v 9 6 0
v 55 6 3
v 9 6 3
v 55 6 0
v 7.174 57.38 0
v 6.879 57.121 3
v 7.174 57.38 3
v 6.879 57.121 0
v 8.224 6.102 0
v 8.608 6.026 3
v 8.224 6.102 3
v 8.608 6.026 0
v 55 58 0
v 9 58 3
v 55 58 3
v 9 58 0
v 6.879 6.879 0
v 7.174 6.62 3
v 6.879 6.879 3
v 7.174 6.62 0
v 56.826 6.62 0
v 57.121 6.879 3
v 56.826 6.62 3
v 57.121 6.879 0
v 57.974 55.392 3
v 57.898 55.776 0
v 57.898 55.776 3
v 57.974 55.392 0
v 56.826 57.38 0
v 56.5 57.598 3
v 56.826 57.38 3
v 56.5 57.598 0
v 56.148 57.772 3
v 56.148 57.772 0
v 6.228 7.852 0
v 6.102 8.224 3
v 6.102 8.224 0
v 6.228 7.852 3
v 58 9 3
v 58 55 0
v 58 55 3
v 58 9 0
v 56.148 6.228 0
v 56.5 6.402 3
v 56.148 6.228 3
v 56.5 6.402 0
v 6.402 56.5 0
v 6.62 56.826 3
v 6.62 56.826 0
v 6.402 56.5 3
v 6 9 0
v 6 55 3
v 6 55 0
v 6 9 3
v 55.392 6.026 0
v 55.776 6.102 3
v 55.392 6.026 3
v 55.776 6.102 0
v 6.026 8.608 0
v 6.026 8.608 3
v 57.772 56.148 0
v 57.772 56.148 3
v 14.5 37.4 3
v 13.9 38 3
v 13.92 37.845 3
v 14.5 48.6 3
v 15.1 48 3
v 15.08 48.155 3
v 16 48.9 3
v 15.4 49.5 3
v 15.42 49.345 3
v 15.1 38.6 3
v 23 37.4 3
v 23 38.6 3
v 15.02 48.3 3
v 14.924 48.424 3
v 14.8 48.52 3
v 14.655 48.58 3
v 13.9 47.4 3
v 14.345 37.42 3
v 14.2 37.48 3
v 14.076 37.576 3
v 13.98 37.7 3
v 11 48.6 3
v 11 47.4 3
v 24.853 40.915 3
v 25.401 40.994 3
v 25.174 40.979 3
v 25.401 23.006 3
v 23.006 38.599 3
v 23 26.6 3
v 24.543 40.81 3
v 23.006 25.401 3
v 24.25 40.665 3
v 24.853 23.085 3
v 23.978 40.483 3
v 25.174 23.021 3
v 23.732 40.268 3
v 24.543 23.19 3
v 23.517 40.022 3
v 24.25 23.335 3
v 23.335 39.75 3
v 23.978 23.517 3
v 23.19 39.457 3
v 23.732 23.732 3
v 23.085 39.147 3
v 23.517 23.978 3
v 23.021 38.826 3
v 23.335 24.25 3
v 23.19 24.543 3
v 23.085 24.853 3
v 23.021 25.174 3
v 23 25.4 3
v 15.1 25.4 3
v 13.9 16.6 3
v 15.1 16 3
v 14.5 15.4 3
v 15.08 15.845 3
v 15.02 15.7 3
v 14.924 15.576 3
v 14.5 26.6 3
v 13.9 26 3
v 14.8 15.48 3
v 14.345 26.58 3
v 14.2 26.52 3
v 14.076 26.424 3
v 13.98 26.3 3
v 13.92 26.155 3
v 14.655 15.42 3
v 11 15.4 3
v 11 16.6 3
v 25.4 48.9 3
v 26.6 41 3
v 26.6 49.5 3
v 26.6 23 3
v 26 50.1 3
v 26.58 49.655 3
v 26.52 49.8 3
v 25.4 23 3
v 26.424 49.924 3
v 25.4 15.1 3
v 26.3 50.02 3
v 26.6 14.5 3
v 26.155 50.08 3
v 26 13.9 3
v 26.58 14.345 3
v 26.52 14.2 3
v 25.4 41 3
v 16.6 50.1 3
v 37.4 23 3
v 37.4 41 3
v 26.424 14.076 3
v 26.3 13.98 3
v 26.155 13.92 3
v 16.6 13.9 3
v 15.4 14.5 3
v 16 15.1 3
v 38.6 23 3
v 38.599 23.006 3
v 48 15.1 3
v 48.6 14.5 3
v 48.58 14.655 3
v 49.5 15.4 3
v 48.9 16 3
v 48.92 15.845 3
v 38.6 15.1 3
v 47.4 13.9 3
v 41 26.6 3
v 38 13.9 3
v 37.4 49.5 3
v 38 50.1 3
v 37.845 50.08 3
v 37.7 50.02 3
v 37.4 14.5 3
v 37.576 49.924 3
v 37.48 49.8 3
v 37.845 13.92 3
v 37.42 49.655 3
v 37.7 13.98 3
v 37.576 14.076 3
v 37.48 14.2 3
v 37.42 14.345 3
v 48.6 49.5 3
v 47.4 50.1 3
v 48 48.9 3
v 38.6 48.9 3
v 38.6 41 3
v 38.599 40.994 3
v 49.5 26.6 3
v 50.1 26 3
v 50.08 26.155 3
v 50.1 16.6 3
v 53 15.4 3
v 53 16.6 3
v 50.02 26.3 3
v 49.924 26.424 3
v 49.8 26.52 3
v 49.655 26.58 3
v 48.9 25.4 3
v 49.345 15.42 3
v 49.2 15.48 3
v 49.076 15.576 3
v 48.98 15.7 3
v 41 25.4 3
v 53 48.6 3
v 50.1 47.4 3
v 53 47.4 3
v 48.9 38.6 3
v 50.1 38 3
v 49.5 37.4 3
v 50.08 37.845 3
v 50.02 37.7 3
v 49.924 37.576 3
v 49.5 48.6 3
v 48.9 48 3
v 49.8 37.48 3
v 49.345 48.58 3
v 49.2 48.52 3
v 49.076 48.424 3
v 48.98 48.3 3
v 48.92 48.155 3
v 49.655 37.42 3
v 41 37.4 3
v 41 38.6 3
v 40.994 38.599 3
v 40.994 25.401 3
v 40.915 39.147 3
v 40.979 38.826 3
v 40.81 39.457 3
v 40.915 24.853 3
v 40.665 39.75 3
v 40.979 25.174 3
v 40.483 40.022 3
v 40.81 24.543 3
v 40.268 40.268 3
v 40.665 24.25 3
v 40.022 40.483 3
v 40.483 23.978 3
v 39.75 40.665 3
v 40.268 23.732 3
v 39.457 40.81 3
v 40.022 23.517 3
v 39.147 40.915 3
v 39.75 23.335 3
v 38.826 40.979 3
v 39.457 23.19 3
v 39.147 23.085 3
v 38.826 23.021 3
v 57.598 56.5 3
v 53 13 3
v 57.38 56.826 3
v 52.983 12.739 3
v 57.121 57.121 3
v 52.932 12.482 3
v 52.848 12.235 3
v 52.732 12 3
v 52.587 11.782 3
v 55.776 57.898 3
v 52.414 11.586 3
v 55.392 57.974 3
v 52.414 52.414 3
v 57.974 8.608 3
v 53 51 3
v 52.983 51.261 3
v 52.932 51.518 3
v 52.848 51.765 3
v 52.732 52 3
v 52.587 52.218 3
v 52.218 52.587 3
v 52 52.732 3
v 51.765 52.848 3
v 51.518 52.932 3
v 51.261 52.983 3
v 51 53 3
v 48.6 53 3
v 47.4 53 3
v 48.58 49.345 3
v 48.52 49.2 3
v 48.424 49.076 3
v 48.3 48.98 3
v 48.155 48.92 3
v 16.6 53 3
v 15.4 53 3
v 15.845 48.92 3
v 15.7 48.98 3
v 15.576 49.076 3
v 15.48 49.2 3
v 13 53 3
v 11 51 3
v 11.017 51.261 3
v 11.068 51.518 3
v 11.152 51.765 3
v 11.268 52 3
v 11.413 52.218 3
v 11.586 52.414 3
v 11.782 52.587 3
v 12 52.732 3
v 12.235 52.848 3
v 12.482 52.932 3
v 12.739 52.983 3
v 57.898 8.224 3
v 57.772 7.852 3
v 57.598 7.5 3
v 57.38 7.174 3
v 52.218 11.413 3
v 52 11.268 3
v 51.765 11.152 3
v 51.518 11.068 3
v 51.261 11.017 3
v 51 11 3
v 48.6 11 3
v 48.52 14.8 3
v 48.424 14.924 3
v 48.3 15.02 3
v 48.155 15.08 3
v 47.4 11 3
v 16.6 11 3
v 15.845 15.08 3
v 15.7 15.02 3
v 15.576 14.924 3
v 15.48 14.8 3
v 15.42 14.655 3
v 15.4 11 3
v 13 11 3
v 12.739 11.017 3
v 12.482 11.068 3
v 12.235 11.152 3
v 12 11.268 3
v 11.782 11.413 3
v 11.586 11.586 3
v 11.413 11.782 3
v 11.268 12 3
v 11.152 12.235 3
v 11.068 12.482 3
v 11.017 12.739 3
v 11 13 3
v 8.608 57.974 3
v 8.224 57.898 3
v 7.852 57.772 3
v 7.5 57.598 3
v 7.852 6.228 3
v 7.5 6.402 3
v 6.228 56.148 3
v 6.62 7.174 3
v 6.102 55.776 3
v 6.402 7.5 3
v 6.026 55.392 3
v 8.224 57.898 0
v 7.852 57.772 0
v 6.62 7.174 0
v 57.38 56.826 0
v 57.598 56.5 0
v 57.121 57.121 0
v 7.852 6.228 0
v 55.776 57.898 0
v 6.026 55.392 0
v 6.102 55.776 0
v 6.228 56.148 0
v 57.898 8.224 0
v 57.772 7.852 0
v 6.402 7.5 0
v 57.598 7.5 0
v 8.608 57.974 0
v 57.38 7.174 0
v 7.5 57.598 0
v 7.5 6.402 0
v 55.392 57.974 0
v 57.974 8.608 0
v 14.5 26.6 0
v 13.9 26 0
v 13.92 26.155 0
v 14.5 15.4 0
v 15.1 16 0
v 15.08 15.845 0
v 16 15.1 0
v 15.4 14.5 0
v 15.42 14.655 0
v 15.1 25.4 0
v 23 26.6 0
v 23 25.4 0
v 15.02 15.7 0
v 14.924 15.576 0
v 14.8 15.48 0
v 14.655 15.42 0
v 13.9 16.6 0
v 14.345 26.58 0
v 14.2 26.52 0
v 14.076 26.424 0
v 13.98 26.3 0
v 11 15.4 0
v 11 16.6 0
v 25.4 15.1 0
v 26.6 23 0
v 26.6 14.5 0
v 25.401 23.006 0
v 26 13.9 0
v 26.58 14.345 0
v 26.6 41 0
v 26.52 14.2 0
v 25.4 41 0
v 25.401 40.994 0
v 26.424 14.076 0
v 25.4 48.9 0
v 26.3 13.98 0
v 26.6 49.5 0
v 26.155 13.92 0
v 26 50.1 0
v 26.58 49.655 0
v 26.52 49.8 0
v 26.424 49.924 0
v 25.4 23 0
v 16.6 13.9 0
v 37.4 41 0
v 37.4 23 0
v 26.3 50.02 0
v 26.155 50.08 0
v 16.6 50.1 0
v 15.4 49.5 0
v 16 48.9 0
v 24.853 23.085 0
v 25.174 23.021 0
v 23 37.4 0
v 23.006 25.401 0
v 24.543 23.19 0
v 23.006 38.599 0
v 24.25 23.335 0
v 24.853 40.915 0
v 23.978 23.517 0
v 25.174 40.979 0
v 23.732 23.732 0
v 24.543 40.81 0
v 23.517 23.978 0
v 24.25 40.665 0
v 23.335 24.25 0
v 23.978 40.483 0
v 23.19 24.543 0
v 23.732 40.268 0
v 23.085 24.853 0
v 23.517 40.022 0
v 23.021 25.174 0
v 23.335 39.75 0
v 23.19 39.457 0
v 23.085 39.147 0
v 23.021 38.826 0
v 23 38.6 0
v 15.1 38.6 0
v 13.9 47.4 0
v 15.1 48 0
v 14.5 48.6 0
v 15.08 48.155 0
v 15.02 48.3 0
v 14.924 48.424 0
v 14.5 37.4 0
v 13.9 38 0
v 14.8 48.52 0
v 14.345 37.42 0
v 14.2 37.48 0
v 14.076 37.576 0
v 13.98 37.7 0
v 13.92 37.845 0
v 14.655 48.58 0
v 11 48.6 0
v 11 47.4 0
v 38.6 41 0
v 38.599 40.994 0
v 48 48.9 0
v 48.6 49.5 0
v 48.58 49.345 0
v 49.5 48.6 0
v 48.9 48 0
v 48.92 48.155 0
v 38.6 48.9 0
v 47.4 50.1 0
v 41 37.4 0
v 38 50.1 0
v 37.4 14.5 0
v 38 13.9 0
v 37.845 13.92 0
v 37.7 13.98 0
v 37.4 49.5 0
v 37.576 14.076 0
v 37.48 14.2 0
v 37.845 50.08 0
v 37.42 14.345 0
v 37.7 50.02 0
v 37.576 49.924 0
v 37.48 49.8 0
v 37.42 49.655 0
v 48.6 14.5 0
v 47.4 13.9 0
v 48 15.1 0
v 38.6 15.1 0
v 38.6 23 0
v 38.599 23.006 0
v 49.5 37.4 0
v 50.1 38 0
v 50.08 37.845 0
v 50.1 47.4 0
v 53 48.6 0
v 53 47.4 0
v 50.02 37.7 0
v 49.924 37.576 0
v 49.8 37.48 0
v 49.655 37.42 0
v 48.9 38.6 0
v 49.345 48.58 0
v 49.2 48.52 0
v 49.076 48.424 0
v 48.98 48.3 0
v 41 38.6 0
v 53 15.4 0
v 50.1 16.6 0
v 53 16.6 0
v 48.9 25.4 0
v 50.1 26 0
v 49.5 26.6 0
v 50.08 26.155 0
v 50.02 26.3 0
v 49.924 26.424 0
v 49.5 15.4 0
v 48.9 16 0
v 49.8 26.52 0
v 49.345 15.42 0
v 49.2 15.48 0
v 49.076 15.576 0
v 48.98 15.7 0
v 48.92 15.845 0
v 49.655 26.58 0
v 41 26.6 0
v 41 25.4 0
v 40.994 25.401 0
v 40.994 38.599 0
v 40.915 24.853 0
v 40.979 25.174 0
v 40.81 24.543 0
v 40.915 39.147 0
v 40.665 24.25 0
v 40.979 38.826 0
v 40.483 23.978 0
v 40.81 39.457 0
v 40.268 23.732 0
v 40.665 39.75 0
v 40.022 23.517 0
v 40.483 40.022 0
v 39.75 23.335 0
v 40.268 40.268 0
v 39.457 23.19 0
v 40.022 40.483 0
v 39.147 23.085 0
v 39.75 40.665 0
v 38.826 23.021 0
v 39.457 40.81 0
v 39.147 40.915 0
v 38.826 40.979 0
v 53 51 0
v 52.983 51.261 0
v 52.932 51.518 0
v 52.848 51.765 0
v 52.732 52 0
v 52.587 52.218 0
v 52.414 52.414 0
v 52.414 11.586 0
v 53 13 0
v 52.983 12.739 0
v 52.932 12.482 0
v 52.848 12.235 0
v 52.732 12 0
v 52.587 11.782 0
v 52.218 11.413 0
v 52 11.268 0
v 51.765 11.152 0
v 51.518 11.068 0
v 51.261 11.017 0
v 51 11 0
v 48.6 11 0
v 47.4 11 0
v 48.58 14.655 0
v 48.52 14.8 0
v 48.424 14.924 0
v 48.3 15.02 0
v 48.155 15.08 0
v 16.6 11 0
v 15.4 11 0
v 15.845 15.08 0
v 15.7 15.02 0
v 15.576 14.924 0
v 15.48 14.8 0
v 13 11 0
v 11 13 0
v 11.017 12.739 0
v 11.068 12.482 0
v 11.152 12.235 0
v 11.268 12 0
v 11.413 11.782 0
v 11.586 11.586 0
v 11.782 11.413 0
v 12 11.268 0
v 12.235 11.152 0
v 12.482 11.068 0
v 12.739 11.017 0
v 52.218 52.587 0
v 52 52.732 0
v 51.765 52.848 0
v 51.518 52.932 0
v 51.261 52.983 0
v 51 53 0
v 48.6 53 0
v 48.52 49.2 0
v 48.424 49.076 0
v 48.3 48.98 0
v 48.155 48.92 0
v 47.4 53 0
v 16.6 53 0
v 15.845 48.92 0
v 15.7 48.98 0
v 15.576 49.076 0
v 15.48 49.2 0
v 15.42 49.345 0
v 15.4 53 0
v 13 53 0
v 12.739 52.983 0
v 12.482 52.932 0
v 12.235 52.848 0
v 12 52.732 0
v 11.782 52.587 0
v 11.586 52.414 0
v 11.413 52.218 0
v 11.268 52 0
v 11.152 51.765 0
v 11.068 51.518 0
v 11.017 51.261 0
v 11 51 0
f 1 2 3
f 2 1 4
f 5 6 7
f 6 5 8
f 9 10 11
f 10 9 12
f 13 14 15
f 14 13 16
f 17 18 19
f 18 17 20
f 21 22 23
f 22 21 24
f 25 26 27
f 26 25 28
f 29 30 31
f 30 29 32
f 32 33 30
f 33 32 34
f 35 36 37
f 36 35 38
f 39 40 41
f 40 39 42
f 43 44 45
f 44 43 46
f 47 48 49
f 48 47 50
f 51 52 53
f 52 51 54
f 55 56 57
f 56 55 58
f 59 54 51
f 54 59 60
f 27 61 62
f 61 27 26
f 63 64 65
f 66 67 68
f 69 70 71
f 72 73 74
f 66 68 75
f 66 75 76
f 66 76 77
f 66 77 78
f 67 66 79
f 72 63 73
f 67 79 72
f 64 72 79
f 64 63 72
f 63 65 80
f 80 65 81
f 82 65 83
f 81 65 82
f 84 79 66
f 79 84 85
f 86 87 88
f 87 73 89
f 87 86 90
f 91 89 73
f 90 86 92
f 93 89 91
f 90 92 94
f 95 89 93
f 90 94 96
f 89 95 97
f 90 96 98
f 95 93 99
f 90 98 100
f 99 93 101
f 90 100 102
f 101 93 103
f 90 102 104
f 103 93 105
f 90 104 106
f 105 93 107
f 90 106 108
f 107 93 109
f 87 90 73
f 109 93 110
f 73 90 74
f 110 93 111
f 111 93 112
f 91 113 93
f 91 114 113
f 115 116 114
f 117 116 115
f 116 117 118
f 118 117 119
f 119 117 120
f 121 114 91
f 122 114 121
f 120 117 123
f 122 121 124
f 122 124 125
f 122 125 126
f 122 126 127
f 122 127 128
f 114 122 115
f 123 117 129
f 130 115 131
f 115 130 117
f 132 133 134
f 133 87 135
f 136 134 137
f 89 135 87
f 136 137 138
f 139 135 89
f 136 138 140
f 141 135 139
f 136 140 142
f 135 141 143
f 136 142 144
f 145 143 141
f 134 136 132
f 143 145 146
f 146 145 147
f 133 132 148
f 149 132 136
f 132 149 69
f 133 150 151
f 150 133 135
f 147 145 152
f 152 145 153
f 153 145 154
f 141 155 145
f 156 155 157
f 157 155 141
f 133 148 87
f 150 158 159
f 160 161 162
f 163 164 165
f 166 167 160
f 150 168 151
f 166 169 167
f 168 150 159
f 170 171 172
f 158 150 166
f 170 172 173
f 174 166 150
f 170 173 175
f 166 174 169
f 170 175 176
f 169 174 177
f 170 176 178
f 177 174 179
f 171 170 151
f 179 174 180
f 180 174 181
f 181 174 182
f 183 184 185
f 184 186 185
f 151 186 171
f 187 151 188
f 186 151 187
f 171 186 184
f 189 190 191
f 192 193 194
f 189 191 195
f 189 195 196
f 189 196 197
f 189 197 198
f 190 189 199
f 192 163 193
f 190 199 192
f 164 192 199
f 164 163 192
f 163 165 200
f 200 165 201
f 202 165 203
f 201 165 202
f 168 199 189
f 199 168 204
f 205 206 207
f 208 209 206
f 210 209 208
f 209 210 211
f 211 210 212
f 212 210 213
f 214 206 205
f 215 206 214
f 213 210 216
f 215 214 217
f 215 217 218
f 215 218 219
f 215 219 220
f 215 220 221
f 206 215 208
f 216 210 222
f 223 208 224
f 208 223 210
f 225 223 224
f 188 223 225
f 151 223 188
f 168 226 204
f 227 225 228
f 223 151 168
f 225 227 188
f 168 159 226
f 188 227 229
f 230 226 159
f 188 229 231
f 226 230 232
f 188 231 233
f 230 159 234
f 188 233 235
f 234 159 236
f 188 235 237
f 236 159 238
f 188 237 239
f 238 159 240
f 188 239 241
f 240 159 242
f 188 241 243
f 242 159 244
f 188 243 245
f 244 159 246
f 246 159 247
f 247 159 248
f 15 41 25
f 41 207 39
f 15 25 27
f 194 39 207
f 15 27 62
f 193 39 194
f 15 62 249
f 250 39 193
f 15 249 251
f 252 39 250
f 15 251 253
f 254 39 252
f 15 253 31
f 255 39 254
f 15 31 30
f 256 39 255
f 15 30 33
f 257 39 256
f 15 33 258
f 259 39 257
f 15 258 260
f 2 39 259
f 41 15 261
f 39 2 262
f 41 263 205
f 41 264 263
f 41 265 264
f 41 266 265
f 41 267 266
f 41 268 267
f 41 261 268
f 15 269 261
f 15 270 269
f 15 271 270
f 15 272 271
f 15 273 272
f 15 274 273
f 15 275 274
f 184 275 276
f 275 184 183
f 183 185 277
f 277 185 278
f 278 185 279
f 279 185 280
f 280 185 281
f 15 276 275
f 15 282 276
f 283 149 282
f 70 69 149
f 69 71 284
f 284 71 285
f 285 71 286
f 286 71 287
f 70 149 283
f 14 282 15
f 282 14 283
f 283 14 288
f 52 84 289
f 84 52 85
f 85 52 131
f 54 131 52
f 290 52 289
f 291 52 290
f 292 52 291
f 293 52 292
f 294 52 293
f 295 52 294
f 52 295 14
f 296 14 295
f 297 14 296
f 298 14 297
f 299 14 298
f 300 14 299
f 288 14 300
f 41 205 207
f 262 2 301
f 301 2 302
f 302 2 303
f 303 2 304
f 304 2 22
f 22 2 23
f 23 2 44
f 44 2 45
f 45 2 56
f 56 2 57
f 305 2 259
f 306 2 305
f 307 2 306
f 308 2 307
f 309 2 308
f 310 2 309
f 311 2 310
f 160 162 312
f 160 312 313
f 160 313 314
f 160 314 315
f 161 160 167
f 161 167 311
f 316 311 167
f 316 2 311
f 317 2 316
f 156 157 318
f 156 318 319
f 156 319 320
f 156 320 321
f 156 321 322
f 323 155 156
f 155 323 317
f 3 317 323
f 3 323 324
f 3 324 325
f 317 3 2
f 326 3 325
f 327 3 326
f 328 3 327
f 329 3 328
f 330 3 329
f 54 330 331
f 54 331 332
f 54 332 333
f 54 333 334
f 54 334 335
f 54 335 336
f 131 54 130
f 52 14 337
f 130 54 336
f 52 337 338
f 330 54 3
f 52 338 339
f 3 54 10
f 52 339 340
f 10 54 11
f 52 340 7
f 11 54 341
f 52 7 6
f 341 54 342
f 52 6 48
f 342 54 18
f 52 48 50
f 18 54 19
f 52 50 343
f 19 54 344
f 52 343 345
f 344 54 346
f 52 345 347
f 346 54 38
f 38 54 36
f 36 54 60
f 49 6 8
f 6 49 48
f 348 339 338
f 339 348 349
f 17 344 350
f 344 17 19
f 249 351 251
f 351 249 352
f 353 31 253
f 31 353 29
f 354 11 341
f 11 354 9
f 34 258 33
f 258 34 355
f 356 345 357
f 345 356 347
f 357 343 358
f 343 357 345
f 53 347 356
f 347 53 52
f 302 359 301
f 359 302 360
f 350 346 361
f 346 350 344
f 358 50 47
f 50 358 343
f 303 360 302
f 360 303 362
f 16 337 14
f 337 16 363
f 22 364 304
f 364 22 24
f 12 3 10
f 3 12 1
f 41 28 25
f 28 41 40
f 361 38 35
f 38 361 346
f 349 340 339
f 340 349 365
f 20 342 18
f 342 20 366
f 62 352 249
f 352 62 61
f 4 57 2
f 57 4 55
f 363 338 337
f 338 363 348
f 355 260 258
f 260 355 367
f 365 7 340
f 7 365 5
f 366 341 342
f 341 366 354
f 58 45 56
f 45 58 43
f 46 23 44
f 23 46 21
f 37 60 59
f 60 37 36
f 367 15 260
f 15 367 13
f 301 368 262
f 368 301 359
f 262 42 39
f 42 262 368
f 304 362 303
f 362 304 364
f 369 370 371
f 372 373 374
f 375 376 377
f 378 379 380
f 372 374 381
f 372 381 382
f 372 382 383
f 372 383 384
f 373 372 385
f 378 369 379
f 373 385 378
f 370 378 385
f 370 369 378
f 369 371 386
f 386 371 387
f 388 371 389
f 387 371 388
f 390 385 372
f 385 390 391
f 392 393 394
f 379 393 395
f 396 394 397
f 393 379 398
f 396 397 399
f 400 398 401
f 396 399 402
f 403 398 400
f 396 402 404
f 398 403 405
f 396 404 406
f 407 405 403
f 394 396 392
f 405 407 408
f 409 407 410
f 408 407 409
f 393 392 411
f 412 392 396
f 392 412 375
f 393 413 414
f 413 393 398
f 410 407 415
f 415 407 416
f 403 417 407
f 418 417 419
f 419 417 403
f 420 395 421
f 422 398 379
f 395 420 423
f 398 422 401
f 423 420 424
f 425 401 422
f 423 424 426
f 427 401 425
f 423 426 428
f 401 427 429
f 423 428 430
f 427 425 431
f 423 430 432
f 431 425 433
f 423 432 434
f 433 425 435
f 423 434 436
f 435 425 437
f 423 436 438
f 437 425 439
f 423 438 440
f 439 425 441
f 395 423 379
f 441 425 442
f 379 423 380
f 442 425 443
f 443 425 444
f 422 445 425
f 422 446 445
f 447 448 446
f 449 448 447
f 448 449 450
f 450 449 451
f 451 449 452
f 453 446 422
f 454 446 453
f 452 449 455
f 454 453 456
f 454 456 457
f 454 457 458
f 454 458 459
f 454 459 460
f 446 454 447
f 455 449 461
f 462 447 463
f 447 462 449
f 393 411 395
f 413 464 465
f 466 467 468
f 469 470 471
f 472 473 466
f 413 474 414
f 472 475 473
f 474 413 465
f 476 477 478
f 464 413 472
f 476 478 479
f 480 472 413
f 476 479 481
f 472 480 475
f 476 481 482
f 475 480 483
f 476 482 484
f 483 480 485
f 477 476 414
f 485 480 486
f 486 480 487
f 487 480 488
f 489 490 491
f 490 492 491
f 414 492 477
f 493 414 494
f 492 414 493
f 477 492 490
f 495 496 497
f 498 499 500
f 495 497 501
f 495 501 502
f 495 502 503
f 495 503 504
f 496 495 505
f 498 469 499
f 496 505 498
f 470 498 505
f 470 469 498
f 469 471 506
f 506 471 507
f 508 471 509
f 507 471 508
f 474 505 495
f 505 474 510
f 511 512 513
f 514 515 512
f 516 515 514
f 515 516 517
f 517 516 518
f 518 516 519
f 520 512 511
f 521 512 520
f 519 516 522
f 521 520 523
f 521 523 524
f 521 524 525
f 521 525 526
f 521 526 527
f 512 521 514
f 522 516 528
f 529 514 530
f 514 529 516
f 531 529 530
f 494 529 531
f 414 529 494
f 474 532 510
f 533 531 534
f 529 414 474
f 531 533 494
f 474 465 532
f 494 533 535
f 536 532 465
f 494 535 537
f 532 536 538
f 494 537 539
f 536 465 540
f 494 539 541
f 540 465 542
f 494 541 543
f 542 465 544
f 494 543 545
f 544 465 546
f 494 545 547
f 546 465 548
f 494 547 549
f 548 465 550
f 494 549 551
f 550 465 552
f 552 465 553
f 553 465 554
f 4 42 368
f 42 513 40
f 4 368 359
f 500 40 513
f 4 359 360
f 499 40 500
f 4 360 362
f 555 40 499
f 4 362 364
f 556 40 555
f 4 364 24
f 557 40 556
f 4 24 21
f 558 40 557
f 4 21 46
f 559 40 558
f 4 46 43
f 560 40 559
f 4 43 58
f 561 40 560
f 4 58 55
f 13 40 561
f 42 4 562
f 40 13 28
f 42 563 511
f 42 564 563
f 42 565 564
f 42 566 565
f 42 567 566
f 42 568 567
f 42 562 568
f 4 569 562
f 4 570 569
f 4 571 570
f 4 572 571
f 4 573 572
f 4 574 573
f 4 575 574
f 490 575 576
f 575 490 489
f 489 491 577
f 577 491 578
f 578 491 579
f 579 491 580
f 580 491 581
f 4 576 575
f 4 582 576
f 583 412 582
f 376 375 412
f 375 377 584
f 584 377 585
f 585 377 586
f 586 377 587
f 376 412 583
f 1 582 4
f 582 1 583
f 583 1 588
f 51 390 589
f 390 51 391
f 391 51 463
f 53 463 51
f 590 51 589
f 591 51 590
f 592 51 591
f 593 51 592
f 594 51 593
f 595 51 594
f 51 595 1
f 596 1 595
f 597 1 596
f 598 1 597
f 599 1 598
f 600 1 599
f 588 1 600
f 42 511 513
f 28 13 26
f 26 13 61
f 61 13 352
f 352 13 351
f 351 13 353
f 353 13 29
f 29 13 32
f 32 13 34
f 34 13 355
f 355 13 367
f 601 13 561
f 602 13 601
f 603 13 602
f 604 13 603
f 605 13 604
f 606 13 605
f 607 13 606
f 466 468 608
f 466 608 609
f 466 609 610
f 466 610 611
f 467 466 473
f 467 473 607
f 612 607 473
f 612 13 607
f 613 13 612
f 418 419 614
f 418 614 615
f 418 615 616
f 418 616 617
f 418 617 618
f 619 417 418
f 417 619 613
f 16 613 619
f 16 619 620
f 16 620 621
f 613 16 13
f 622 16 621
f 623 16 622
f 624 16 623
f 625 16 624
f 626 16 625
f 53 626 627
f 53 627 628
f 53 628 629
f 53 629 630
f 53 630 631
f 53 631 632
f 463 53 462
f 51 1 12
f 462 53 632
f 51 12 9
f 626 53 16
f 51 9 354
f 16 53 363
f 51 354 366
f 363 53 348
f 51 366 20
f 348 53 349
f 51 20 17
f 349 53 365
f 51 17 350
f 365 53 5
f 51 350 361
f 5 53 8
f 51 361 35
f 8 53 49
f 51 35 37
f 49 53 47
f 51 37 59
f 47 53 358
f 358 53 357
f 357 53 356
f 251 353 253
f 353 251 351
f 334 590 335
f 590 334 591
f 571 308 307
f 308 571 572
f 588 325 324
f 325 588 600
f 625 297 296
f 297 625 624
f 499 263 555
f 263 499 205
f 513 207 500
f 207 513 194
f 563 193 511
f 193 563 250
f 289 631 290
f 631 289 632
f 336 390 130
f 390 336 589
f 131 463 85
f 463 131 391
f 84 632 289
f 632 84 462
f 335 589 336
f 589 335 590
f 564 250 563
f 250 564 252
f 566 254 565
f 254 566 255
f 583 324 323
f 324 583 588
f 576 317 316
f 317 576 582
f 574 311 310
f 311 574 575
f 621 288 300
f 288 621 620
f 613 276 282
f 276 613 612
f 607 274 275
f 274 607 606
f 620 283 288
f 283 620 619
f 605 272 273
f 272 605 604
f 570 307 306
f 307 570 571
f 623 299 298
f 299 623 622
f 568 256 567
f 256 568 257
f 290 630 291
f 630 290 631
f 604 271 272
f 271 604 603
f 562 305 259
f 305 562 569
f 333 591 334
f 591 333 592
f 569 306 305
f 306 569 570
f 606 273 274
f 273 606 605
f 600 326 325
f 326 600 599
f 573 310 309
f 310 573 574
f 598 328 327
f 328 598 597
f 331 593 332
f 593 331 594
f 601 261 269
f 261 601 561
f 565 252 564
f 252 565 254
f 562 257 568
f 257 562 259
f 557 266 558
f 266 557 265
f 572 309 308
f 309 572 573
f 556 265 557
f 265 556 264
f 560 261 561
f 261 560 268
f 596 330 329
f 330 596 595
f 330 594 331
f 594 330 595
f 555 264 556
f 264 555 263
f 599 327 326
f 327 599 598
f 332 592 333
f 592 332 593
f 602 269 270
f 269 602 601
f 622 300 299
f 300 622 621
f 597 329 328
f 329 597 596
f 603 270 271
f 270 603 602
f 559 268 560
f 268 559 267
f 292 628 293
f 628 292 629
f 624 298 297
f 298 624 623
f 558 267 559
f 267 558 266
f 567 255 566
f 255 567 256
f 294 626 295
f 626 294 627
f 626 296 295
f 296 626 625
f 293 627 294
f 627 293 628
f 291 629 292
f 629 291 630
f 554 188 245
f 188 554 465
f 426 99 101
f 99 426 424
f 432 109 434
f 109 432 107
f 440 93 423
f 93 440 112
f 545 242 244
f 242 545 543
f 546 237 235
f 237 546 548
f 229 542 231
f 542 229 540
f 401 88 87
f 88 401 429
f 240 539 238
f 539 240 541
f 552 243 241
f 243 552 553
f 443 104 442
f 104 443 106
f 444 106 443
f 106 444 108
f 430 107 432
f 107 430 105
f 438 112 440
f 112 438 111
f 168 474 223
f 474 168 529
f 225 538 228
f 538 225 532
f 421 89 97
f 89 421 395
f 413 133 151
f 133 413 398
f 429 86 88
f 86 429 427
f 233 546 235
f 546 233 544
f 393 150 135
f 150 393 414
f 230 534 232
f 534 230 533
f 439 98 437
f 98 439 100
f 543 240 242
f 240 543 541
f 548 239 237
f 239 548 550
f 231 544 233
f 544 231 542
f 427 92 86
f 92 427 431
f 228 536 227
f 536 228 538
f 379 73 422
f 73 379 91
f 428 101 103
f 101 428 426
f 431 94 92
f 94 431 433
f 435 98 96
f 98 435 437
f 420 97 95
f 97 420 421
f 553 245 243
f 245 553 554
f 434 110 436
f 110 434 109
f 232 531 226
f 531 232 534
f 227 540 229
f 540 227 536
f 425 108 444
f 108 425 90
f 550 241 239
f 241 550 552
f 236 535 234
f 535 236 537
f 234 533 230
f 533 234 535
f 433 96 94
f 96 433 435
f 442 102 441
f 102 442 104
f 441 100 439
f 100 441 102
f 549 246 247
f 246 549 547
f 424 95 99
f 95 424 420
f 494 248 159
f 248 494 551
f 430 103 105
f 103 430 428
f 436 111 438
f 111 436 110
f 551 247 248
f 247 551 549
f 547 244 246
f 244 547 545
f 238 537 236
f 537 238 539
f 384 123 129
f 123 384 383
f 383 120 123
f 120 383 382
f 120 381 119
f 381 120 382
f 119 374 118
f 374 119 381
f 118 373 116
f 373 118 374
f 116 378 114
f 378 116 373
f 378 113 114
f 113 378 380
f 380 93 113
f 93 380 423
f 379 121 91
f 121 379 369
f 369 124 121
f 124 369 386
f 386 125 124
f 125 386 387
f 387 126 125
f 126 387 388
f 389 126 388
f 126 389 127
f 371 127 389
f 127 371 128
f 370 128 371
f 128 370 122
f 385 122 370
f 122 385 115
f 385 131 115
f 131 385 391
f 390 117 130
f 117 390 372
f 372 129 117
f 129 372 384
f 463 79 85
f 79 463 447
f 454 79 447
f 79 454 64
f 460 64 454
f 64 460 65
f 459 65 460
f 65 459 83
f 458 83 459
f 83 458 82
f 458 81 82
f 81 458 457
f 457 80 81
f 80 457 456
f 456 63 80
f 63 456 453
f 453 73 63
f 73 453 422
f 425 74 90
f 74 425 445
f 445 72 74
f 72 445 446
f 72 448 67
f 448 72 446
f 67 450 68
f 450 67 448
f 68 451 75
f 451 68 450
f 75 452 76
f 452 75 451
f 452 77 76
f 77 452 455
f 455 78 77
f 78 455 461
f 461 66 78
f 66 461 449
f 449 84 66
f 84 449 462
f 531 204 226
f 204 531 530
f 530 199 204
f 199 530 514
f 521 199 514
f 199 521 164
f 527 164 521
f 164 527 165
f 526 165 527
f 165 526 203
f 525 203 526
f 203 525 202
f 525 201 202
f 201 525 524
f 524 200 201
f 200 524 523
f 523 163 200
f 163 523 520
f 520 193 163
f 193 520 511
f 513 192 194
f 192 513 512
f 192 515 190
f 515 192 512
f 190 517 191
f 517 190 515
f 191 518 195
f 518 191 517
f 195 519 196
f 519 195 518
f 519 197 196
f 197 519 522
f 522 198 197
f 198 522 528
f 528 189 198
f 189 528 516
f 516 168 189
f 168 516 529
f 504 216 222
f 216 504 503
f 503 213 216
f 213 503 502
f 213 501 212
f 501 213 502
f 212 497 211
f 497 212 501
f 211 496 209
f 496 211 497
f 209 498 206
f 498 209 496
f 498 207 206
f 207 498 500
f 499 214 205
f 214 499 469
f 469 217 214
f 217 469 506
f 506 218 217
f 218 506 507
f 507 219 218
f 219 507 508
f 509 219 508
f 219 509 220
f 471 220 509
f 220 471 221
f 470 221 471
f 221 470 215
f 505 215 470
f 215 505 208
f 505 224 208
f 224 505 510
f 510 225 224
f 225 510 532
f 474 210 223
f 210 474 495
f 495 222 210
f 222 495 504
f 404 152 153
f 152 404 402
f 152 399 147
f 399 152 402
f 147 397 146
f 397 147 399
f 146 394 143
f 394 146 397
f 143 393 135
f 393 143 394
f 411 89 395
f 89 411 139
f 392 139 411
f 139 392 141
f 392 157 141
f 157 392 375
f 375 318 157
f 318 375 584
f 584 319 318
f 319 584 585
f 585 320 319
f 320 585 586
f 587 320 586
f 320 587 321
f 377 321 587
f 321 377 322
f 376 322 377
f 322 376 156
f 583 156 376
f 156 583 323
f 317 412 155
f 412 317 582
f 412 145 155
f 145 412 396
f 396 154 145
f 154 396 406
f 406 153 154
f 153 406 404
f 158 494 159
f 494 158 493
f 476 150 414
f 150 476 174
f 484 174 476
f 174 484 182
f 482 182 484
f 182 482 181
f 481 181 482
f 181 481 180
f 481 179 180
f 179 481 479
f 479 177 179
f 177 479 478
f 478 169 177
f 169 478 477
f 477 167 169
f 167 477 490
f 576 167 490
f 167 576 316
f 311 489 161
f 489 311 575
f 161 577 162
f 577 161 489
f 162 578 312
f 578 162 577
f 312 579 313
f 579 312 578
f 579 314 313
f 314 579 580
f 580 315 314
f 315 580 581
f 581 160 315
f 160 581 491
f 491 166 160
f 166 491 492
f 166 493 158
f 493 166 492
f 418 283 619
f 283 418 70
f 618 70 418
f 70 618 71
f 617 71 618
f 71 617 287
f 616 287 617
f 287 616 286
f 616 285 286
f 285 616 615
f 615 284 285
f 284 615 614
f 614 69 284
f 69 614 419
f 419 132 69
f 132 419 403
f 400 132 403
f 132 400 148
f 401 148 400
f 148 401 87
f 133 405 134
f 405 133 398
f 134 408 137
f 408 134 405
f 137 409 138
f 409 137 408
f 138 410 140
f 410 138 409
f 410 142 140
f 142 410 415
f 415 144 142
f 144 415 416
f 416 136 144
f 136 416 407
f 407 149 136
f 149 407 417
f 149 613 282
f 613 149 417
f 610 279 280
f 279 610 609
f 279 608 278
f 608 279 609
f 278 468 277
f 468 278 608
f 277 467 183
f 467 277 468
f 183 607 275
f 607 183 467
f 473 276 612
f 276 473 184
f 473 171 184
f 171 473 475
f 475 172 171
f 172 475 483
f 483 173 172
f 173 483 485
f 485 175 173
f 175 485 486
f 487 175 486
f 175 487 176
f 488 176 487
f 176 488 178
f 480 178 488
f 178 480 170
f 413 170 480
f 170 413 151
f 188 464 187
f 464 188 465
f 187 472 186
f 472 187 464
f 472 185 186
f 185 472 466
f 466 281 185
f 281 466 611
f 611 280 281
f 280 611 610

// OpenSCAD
/*
Sample 027: XY-Festkörpertisch — steif 1,2 mm
Generated from the FDM Mechanical Sample Library.
Units: millimetres.

Override examples:
  openscad -o custom.stl -D 'view="plate"' -D 'render_fn=64' model.scad
  openscad -o preview.png -D 'view="assembly"' model.scad
*/
use <../../../library/fdm_mechanisms.scad>

render_fn = is_undef(render_fn) ? 48 : render_fn;
view = is_undef(view) ? "plate" : view;
$fn = render_fn;

sample_xy_flexure_stage(
    view=view,
    beam_w=1.2,
    beam_l=17
);
